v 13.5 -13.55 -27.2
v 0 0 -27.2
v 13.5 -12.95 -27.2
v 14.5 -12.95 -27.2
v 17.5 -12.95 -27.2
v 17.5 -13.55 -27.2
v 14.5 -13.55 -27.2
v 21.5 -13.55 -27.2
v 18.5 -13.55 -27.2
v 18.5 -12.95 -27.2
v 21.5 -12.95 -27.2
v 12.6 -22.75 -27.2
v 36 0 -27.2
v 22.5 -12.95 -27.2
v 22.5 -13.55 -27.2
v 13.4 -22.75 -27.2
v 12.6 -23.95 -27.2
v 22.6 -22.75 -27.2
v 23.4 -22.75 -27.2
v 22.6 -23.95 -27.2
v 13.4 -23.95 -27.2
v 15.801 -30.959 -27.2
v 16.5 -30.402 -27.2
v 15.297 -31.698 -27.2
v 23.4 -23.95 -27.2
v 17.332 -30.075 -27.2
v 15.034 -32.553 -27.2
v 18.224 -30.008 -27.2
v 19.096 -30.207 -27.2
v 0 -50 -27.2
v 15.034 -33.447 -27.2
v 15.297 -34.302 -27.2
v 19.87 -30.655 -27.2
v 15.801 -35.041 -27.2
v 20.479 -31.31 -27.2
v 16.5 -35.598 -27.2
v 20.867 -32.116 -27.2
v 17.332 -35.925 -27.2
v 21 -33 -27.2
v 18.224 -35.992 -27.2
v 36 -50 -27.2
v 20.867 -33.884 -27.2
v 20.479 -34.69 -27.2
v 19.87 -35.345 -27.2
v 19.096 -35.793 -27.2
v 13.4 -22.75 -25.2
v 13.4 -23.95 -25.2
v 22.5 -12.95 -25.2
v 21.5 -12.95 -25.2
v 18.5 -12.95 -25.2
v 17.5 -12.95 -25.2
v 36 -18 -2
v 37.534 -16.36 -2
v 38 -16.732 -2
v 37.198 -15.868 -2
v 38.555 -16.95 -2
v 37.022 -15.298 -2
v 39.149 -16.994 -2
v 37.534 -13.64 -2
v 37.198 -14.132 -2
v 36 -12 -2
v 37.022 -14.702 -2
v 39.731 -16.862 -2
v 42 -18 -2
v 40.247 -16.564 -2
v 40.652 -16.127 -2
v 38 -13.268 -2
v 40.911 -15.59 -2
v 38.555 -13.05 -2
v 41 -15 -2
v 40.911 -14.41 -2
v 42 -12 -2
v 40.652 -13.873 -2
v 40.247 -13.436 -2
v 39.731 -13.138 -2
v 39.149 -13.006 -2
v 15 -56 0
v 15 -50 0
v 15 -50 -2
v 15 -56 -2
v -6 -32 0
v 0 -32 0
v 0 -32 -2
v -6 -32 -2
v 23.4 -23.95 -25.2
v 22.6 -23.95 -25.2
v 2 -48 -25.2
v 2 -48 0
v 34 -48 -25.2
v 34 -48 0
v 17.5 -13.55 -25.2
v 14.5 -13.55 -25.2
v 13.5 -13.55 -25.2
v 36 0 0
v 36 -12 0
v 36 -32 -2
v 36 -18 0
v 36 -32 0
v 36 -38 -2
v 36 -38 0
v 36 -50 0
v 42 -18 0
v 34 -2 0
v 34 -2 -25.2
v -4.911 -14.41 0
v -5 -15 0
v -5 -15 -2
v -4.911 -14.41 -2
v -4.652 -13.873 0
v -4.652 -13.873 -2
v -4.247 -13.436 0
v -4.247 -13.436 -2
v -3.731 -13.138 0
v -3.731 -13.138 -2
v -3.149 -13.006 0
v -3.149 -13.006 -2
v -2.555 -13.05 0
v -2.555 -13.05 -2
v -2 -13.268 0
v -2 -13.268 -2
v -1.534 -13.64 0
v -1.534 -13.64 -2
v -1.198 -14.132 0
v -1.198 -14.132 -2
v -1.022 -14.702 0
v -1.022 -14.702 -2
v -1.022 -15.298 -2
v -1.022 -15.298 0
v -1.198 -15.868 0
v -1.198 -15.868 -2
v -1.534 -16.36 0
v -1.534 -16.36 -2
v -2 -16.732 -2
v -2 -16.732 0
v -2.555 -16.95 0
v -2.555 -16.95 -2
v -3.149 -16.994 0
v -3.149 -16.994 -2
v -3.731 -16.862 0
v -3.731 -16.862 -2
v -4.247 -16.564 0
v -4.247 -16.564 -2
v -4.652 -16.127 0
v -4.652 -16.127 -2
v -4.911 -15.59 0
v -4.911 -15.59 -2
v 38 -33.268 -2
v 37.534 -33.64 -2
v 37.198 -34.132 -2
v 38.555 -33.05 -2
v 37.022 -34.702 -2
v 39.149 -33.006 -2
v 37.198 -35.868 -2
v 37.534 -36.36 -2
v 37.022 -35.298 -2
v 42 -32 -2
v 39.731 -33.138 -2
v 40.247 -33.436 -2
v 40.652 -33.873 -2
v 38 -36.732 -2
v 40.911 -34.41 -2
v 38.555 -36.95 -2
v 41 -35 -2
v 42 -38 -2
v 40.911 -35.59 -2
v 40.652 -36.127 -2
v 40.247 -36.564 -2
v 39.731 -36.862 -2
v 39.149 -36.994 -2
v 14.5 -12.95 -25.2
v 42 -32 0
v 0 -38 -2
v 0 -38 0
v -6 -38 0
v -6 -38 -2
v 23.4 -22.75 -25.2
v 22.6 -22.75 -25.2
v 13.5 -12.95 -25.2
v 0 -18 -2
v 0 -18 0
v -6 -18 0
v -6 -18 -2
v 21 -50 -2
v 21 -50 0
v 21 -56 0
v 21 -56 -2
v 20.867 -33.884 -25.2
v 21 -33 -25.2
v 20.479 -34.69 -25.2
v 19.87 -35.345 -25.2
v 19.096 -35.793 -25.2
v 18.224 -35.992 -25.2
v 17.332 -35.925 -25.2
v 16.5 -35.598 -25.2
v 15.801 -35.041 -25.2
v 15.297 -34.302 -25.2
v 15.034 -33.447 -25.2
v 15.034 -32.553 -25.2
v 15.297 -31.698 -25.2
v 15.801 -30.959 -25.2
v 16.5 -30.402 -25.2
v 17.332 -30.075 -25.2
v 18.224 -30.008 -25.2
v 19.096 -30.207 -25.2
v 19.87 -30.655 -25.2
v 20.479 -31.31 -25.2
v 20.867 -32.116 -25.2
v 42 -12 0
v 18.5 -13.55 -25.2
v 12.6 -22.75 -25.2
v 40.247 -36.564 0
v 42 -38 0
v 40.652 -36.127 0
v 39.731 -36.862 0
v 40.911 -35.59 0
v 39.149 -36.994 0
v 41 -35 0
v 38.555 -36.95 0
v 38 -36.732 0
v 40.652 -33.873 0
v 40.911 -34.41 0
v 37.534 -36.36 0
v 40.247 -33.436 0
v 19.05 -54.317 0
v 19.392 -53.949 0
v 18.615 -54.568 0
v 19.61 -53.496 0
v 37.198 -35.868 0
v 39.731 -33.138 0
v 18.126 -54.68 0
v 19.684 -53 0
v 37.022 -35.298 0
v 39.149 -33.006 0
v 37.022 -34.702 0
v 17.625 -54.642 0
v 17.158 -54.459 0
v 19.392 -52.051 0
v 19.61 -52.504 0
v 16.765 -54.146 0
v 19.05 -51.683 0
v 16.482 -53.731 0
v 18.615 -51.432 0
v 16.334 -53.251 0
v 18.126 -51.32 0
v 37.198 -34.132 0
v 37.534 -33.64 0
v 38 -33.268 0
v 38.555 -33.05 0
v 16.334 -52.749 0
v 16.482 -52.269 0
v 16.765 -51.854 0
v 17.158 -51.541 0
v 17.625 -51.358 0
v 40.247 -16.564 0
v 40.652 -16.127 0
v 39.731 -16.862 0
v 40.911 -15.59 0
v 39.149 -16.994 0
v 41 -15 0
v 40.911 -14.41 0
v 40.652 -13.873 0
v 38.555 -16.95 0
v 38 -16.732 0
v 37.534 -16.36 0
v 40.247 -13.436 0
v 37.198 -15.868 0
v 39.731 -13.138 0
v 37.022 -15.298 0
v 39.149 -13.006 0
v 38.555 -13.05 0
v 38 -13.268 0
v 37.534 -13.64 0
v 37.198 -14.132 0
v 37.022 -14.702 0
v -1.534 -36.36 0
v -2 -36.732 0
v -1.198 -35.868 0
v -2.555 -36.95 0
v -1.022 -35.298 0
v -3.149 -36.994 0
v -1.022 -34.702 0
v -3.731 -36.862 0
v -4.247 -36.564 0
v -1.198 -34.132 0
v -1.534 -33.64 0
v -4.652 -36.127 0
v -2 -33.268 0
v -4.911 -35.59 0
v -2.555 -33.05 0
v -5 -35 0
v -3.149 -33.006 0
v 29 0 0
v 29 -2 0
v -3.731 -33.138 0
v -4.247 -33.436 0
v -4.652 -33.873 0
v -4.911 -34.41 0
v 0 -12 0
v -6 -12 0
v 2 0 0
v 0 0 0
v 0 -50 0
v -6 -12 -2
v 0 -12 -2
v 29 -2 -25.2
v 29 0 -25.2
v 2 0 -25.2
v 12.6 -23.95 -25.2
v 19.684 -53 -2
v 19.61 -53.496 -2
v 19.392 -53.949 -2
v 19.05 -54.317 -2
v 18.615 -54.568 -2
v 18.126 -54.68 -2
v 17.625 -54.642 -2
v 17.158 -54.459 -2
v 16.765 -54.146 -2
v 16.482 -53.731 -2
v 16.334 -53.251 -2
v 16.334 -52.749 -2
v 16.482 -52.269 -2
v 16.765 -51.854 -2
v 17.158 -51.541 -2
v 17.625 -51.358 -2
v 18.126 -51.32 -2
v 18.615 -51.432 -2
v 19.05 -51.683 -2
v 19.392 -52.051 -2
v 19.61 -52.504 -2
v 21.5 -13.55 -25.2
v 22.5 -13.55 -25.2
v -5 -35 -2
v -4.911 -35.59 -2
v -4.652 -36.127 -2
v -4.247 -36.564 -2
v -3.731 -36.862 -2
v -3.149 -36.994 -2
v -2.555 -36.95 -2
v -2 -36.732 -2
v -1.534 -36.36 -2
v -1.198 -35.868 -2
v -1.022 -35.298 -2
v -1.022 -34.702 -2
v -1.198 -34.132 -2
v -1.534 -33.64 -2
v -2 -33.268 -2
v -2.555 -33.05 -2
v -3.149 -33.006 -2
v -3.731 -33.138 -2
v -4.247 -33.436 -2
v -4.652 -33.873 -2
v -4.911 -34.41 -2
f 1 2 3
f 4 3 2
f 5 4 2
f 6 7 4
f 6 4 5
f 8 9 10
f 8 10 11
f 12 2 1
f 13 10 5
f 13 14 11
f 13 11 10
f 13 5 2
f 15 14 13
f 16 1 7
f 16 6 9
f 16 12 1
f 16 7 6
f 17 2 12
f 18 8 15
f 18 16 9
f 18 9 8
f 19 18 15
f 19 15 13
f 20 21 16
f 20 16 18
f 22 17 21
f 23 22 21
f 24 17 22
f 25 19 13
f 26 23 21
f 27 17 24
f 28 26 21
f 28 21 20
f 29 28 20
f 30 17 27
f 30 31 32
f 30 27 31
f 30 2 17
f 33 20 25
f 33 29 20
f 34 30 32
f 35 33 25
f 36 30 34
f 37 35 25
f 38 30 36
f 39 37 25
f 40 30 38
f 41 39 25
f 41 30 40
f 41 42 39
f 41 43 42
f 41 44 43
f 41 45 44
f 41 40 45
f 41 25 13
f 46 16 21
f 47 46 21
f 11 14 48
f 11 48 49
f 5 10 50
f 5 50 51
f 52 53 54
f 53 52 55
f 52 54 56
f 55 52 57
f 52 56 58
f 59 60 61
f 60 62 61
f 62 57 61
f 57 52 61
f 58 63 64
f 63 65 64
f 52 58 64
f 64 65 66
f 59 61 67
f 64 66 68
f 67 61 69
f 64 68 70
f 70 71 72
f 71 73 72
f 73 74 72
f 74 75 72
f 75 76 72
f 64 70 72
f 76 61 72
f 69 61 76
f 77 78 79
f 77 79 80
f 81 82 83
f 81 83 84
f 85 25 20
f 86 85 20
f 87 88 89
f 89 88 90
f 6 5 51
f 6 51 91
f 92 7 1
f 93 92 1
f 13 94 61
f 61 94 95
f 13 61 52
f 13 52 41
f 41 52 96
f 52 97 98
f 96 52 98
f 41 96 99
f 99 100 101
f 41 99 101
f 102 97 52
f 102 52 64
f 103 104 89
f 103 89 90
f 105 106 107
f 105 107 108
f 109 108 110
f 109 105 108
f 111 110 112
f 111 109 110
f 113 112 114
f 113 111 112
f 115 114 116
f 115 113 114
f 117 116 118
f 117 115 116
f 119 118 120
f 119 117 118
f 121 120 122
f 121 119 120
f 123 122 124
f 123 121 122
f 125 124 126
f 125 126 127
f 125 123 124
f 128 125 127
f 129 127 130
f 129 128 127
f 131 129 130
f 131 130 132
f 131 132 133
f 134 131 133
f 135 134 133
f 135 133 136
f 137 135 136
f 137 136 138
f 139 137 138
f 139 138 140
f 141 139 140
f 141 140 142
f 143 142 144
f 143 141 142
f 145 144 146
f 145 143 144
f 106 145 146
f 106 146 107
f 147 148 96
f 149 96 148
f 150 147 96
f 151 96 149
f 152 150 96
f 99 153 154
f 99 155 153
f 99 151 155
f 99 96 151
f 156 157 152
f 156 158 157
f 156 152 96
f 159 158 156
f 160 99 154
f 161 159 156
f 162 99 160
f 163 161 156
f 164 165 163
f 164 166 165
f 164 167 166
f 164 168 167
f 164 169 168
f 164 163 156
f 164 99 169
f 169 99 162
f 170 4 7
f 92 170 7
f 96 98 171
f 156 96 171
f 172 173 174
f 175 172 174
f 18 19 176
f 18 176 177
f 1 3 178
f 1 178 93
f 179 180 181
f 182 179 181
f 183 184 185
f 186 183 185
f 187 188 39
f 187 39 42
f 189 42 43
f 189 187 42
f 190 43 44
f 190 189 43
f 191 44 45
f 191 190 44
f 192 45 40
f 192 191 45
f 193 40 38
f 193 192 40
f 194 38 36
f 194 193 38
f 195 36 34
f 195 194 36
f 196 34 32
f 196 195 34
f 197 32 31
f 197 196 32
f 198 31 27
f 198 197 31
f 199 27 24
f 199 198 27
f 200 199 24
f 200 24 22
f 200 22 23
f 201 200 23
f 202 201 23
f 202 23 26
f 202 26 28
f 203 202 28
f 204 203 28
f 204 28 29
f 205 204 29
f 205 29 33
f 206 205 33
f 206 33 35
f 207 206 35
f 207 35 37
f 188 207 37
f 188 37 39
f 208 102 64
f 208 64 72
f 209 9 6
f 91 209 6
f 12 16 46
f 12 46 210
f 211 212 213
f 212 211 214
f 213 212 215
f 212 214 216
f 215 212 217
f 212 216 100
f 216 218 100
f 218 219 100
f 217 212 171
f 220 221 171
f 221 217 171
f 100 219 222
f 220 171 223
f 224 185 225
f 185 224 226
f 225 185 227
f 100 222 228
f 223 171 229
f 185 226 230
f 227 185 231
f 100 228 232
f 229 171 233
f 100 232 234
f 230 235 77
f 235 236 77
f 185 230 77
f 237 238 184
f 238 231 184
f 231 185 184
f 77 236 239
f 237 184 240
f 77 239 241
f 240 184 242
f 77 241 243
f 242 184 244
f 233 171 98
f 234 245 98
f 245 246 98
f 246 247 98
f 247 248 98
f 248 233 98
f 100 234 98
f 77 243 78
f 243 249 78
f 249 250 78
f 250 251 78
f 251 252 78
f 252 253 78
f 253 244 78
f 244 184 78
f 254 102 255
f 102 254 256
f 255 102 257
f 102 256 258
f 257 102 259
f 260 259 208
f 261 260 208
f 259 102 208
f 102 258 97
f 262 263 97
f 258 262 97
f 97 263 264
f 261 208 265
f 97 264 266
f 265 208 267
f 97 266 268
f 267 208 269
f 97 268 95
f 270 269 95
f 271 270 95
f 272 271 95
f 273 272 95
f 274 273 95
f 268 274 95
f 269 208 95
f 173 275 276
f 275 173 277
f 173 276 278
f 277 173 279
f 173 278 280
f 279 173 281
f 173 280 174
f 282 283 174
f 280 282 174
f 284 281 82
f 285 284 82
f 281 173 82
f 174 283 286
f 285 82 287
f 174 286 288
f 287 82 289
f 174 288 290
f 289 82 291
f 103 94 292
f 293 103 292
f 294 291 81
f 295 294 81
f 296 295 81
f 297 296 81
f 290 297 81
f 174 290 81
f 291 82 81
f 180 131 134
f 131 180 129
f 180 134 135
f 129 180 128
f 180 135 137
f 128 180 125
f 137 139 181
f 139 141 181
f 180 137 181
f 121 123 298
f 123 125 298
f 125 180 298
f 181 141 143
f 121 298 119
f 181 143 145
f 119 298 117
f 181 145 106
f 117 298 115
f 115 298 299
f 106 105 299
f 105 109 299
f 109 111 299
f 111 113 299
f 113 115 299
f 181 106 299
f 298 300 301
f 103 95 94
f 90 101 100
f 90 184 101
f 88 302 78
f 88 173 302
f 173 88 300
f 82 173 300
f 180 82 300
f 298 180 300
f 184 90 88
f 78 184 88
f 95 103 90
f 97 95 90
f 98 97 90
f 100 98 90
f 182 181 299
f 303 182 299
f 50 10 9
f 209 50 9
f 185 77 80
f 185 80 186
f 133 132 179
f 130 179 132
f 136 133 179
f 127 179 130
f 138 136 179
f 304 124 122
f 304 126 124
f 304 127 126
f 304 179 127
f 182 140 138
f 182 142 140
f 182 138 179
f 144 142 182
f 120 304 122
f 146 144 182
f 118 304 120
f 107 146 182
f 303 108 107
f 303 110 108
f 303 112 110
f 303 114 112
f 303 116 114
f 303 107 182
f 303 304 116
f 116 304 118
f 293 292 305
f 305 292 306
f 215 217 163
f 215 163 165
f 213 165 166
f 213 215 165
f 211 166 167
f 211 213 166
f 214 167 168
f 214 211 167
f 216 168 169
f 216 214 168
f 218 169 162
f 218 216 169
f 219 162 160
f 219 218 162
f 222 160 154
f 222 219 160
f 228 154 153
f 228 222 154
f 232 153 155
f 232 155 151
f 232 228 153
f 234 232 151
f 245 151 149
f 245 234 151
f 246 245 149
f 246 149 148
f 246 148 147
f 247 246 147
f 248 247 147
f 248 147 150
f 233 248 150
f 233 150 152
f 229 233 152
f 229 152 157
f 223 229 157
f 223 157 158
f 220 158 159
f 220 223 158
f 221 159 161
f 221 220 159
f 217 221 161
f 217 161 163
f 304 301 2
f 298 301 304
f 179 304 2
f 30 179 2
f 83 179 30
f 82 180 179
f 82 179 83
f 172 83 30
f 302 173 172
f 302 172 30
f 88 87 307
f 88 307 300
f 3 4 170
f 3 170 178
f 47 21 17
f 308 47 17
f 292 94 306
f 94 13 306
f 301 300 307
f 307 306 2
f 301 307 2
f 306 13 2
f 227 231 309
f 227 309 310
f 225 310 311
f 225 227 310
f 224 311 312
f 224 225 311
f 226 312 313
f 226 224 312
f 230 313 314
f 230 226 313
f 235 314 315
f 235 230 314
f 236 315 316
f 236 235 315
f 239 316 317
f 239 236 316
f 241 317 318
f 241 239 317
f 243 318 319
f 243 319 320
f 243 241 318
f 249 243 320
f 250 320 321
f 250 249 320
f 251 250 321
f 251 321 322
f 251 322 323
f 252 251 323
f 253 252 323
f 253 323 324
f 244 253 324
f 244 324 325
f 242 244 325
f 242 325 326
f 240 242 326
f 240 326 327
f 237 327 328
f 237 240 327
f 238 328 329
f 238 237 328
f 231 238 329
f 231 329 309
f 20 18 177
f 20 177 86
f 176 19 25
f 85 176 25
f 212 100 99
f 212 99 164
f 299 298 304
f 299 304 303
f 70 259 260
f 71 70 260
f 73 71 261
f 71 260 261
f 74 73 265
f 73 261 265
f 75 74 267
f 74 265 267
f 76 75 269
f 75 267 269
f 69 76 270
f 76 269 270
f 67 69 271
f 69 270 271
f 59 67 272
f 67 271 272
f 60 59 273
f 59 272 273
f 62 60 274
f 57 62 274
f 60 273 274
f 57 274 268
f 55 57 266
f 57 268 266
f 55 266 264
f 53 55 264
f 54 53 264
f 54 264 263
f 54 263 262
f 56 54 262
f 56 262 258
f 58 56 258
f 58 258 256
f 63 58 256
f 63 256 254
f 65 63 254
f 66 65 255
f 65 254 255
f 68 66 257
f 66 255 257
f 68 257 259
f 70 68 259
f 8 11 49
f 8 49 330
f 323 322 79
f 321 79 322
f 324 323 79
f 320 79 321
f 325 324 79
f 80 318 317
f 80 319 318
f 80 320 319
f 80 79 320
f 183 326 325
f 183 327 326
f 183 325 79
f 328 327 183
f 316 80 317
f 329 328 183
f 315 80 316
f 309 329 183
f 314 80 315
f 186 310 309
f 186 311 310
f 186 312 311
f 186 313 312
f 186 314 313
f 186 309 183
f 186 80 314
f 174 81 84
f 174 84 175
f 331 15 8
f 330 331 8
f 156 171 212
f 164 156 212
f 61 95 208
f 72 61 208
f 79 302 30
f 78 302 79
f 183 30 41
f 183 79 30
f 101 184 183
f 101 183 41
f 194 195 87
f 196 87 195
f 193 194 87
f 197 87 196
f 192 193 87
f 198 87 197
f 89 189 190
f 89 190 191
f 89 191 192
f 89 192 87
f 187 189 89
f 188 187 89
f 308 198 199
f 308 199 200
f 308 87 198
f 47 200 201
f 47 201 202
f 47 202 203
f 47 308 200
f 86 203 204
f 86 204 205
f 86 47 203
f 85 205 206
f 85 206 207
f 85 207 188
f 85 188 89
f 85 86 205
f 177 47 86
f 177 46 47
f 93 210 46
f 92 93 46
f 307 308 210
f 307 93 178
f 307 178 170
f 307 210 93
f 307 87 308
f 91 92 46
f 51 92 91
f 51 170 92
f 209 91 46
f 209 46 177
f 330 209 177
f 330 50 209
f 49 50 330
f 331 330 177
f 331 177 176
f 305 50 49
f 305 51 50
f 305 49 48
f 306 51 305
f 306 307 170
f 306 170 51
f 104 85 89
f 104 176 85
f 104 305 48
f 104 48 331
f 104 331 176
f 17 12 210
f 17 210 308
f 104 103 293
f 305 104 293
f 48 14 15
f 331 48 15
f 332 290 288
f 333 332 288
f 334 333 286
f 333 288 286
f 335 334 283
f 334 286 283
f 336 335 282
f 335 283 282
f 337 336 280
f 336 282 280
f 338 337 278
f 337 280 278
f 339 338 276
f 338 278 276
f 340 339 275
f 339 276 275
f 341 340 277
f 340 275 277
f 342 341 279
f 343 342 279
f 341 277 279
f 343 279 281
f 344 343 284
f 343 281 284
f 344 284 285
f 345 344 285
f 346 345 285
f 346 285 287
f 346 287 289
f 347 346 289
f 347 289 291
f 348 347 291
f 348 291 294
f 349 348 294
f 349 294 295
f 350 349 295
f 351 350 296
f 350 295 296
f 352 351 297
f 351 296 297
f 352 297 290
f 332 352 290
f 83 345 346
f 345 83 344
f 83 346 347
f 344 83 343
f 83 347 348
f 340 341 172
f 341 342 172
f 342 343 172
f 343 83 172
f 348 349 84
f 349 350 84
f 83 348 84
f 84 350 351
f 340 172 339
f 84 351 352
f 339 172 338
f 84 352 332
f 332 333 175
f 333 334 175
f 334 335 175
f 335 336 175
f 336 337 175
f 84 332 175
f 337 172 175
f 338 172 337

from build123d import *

# Parameters (mm, degrees)
SKETCH1_W           = 36
SKETCH1_H           = 50
BOSS_EXTRUDE1_DEPTH = 27.2
CUT_EXTRUDE1_REACH  = 69.349
SKETCH2_R           = 3
SKETCH8_W           = 32
SKETCH8_H           = 46
CUT_EXTRUDE2_DEPTH  = 25.2
SKETCH12_W          = 1
SKETCH12_H          = 0.6
SKETCH12_W_2        = 0.8
SKETCH12_H_2        = 1.2
CUT_EXTRUDE3_DEPTH  = 25.2
SKETCH14_W          = 32
SKETCH14_H          = 25.2
CUT_EXTRUDE4_DEPTH  = 25.2
SKETCH16_W          = 5
SKETCH16_H          = 25.2
BOSS_EXTRUDE2_DEPTH = 2
SKETCH17_W          = 6
SKETCH17_H          = 6
BOSS_EXTRUDE3_DEPTH = 2
SKETCH18_R          = 2
CUT_EXTRUDE5_DEPTH  = 2
SKETCH20_W          = 6
SKETCH20_H          = 6
BOSS_EXTRUDE4_DEPTH = 2
SKETCH21_R          = 1.684389361
CUT_EXTRUDE6_DEPTH  = 2


with BuildPart() as part:
    # Sketch1 → Boss-Extrude1 (new body)
    with BuildSketch(Plane.XY):
        with Locations((18, 25)):
            Rectangle(SKETCH1_W, SKETCH1_H)
    extrude(amount=-BOSS_EXTRUDE1_DEPTH)

    # Sketch2 → Cut-Extrude1 (cut, up to next)
    with BuildSketch(Plane.XY, mode=Mode.PRIVATE) as cut_extrude1_sk1:
        with Locations((18, 33)):
            Circle(SKETCH2_R)
    cut_extrude1_tool1 = extrude(cut_extrude1_sk1.sketch, amount=-CUT_EXTRUDE1_REACH, mode=Mode.PRIVATE) & part.part
    add(cut_extrude1_tool1.solids().sort_by_distance((18, 33, 0))[0], mode=Mode.SUBTRACT)

    # Sketch8 → Cut-Extrude2 (cut)
    with BuildSketch(Plane.XY):
        with Locations((18, 25)):
            Rectangle(SKETCH8_W, SKETCH8_H)
    extrude(amount=-CUT_EXTRUDE2_DEPTH, mode=Mode.SUBTRACT)

    # Sketch12 → Cut-Extrude3 (cut)
    with BuildSketch(Plane(origin=(0, 0, -27.2), x_dir=(-1, 0, 0), z_dir=(0, 0, -1))):
        with Locations((-14, 13.25)):
            Rectangle(SKETCH12_W, SKETCH12_H)
        with Locations((-18, 13.25)):
            Rectangle(SKETCH12_W, SKETCH12_H)
        with Locations((-22, 13.25)):
            Rectangle(SKETCH12_W, SKETCH12_H)
        with Locations((-13, 23.35)):
            Rectangle(SKETCH12_W_2, SKETCH12_H_2)
        with Locations((-23, 23.35)):
            Rectangle(SKETCH12_W_2, SKETCH12_H_2)
    extrude(amount=-CUT_EXTRUDE3_DEPTH, mode=Mode.SUBTRACT)

    # Sketch14 → Cut-Extrude4 (cut)
    with BuildSketch(Plane.XZ):
        with Locations((18, -12.6)):
            Rectangle(SKETCH14_W, SKETCH14_H)
    extrude(amount=-CUT_EXTRUDE4_DEPTH, mode=Mode.SUBTRACT)

    # Sketch16 → Boss-Extrude2 (add)
    with BuildSketch(Plane(origin=(0, 0, 0), x_dir=(-1, 0, 0), z_dir=(0, -1, 0))):
        with Locations((-31.5, 12.6)):
            Rectangle(SKETCH16_W, SKETCH16_H)
    extrude(amount=-BOSS_EXTRUDE2_DEPTH)

    # Sketch20 → Boss-Extrude4 (add)
    with BuildSketch(Plane.XY):
        with Locations((18, 53)):
            Rectangle(SKETCH20_W, SKETCH20_H)
    extrude(amount=-BOSS_EXTRUDE4_DEPTH)

    # Sketch21 → Cut-Extrude6 (cut)
    with BuildSketch(Plane.XY):
        with Locations((18, 53)):
            Circle(SKETCH21_R)
    extrude(amount=-CUT_EXTRUDE6_DEPTH, mode=Mode.SUBTRACT)


with BuildPart() as body_2:
    # Sketch17 → Boss-Extrude3 (new body)
    with BuildSketch(Plane.XY):
        with Locations((39, 35)):
            Rectangle(SKETCH17_W, SKETCH17_H)
    extrude(amount=-BOSS_EXTRUDE3_DEPTH)

    # Sketch18 → Cut-Extrude5 (cut)
    with BuildSketch(Plane.XY):
        with Locations((39, 35)):
            Circle(SKETCH18_R)
    extrude(amount=-CUT_EXTRUDE5_DEPTH, mode=Mode.SUBTRACT)


with BuildPart() as body_3:
    # Mirror1: mirrored copy
    add(body_2.part.mirror(Plane(origin=(0, 25, 0), x_dir=(0, 0, 1), z_dir=(0, -1, 0))))


with BuildPart() as body_4:
    # Mirror2: mirrored copy
    add(body_2.part.mirror(Plane.ZY.offset(-18)))


with BuildPart() as body_5:
    # Mirror2 2: mirrored copy
    add(body_3.part.mirror(Plane.ZY.offset(-18)))


with BuildPart() as part_1:
    add(part.part)

    # Combine1: union body 3, body 2, body 4, body 5
    add(body_3.part)
    add(body_2.part)
    add(body_4.part)
    add(body_5.part)


with BuildPart() as body_2_2:
    # Mirror6: mirrored copy
    add(part_1.part.mirror(Plane(origin=(0, 0, 0), x_dir=(0, 0, 1), z_dir=(0, -1, 0))))


solid = body_2_2.part
